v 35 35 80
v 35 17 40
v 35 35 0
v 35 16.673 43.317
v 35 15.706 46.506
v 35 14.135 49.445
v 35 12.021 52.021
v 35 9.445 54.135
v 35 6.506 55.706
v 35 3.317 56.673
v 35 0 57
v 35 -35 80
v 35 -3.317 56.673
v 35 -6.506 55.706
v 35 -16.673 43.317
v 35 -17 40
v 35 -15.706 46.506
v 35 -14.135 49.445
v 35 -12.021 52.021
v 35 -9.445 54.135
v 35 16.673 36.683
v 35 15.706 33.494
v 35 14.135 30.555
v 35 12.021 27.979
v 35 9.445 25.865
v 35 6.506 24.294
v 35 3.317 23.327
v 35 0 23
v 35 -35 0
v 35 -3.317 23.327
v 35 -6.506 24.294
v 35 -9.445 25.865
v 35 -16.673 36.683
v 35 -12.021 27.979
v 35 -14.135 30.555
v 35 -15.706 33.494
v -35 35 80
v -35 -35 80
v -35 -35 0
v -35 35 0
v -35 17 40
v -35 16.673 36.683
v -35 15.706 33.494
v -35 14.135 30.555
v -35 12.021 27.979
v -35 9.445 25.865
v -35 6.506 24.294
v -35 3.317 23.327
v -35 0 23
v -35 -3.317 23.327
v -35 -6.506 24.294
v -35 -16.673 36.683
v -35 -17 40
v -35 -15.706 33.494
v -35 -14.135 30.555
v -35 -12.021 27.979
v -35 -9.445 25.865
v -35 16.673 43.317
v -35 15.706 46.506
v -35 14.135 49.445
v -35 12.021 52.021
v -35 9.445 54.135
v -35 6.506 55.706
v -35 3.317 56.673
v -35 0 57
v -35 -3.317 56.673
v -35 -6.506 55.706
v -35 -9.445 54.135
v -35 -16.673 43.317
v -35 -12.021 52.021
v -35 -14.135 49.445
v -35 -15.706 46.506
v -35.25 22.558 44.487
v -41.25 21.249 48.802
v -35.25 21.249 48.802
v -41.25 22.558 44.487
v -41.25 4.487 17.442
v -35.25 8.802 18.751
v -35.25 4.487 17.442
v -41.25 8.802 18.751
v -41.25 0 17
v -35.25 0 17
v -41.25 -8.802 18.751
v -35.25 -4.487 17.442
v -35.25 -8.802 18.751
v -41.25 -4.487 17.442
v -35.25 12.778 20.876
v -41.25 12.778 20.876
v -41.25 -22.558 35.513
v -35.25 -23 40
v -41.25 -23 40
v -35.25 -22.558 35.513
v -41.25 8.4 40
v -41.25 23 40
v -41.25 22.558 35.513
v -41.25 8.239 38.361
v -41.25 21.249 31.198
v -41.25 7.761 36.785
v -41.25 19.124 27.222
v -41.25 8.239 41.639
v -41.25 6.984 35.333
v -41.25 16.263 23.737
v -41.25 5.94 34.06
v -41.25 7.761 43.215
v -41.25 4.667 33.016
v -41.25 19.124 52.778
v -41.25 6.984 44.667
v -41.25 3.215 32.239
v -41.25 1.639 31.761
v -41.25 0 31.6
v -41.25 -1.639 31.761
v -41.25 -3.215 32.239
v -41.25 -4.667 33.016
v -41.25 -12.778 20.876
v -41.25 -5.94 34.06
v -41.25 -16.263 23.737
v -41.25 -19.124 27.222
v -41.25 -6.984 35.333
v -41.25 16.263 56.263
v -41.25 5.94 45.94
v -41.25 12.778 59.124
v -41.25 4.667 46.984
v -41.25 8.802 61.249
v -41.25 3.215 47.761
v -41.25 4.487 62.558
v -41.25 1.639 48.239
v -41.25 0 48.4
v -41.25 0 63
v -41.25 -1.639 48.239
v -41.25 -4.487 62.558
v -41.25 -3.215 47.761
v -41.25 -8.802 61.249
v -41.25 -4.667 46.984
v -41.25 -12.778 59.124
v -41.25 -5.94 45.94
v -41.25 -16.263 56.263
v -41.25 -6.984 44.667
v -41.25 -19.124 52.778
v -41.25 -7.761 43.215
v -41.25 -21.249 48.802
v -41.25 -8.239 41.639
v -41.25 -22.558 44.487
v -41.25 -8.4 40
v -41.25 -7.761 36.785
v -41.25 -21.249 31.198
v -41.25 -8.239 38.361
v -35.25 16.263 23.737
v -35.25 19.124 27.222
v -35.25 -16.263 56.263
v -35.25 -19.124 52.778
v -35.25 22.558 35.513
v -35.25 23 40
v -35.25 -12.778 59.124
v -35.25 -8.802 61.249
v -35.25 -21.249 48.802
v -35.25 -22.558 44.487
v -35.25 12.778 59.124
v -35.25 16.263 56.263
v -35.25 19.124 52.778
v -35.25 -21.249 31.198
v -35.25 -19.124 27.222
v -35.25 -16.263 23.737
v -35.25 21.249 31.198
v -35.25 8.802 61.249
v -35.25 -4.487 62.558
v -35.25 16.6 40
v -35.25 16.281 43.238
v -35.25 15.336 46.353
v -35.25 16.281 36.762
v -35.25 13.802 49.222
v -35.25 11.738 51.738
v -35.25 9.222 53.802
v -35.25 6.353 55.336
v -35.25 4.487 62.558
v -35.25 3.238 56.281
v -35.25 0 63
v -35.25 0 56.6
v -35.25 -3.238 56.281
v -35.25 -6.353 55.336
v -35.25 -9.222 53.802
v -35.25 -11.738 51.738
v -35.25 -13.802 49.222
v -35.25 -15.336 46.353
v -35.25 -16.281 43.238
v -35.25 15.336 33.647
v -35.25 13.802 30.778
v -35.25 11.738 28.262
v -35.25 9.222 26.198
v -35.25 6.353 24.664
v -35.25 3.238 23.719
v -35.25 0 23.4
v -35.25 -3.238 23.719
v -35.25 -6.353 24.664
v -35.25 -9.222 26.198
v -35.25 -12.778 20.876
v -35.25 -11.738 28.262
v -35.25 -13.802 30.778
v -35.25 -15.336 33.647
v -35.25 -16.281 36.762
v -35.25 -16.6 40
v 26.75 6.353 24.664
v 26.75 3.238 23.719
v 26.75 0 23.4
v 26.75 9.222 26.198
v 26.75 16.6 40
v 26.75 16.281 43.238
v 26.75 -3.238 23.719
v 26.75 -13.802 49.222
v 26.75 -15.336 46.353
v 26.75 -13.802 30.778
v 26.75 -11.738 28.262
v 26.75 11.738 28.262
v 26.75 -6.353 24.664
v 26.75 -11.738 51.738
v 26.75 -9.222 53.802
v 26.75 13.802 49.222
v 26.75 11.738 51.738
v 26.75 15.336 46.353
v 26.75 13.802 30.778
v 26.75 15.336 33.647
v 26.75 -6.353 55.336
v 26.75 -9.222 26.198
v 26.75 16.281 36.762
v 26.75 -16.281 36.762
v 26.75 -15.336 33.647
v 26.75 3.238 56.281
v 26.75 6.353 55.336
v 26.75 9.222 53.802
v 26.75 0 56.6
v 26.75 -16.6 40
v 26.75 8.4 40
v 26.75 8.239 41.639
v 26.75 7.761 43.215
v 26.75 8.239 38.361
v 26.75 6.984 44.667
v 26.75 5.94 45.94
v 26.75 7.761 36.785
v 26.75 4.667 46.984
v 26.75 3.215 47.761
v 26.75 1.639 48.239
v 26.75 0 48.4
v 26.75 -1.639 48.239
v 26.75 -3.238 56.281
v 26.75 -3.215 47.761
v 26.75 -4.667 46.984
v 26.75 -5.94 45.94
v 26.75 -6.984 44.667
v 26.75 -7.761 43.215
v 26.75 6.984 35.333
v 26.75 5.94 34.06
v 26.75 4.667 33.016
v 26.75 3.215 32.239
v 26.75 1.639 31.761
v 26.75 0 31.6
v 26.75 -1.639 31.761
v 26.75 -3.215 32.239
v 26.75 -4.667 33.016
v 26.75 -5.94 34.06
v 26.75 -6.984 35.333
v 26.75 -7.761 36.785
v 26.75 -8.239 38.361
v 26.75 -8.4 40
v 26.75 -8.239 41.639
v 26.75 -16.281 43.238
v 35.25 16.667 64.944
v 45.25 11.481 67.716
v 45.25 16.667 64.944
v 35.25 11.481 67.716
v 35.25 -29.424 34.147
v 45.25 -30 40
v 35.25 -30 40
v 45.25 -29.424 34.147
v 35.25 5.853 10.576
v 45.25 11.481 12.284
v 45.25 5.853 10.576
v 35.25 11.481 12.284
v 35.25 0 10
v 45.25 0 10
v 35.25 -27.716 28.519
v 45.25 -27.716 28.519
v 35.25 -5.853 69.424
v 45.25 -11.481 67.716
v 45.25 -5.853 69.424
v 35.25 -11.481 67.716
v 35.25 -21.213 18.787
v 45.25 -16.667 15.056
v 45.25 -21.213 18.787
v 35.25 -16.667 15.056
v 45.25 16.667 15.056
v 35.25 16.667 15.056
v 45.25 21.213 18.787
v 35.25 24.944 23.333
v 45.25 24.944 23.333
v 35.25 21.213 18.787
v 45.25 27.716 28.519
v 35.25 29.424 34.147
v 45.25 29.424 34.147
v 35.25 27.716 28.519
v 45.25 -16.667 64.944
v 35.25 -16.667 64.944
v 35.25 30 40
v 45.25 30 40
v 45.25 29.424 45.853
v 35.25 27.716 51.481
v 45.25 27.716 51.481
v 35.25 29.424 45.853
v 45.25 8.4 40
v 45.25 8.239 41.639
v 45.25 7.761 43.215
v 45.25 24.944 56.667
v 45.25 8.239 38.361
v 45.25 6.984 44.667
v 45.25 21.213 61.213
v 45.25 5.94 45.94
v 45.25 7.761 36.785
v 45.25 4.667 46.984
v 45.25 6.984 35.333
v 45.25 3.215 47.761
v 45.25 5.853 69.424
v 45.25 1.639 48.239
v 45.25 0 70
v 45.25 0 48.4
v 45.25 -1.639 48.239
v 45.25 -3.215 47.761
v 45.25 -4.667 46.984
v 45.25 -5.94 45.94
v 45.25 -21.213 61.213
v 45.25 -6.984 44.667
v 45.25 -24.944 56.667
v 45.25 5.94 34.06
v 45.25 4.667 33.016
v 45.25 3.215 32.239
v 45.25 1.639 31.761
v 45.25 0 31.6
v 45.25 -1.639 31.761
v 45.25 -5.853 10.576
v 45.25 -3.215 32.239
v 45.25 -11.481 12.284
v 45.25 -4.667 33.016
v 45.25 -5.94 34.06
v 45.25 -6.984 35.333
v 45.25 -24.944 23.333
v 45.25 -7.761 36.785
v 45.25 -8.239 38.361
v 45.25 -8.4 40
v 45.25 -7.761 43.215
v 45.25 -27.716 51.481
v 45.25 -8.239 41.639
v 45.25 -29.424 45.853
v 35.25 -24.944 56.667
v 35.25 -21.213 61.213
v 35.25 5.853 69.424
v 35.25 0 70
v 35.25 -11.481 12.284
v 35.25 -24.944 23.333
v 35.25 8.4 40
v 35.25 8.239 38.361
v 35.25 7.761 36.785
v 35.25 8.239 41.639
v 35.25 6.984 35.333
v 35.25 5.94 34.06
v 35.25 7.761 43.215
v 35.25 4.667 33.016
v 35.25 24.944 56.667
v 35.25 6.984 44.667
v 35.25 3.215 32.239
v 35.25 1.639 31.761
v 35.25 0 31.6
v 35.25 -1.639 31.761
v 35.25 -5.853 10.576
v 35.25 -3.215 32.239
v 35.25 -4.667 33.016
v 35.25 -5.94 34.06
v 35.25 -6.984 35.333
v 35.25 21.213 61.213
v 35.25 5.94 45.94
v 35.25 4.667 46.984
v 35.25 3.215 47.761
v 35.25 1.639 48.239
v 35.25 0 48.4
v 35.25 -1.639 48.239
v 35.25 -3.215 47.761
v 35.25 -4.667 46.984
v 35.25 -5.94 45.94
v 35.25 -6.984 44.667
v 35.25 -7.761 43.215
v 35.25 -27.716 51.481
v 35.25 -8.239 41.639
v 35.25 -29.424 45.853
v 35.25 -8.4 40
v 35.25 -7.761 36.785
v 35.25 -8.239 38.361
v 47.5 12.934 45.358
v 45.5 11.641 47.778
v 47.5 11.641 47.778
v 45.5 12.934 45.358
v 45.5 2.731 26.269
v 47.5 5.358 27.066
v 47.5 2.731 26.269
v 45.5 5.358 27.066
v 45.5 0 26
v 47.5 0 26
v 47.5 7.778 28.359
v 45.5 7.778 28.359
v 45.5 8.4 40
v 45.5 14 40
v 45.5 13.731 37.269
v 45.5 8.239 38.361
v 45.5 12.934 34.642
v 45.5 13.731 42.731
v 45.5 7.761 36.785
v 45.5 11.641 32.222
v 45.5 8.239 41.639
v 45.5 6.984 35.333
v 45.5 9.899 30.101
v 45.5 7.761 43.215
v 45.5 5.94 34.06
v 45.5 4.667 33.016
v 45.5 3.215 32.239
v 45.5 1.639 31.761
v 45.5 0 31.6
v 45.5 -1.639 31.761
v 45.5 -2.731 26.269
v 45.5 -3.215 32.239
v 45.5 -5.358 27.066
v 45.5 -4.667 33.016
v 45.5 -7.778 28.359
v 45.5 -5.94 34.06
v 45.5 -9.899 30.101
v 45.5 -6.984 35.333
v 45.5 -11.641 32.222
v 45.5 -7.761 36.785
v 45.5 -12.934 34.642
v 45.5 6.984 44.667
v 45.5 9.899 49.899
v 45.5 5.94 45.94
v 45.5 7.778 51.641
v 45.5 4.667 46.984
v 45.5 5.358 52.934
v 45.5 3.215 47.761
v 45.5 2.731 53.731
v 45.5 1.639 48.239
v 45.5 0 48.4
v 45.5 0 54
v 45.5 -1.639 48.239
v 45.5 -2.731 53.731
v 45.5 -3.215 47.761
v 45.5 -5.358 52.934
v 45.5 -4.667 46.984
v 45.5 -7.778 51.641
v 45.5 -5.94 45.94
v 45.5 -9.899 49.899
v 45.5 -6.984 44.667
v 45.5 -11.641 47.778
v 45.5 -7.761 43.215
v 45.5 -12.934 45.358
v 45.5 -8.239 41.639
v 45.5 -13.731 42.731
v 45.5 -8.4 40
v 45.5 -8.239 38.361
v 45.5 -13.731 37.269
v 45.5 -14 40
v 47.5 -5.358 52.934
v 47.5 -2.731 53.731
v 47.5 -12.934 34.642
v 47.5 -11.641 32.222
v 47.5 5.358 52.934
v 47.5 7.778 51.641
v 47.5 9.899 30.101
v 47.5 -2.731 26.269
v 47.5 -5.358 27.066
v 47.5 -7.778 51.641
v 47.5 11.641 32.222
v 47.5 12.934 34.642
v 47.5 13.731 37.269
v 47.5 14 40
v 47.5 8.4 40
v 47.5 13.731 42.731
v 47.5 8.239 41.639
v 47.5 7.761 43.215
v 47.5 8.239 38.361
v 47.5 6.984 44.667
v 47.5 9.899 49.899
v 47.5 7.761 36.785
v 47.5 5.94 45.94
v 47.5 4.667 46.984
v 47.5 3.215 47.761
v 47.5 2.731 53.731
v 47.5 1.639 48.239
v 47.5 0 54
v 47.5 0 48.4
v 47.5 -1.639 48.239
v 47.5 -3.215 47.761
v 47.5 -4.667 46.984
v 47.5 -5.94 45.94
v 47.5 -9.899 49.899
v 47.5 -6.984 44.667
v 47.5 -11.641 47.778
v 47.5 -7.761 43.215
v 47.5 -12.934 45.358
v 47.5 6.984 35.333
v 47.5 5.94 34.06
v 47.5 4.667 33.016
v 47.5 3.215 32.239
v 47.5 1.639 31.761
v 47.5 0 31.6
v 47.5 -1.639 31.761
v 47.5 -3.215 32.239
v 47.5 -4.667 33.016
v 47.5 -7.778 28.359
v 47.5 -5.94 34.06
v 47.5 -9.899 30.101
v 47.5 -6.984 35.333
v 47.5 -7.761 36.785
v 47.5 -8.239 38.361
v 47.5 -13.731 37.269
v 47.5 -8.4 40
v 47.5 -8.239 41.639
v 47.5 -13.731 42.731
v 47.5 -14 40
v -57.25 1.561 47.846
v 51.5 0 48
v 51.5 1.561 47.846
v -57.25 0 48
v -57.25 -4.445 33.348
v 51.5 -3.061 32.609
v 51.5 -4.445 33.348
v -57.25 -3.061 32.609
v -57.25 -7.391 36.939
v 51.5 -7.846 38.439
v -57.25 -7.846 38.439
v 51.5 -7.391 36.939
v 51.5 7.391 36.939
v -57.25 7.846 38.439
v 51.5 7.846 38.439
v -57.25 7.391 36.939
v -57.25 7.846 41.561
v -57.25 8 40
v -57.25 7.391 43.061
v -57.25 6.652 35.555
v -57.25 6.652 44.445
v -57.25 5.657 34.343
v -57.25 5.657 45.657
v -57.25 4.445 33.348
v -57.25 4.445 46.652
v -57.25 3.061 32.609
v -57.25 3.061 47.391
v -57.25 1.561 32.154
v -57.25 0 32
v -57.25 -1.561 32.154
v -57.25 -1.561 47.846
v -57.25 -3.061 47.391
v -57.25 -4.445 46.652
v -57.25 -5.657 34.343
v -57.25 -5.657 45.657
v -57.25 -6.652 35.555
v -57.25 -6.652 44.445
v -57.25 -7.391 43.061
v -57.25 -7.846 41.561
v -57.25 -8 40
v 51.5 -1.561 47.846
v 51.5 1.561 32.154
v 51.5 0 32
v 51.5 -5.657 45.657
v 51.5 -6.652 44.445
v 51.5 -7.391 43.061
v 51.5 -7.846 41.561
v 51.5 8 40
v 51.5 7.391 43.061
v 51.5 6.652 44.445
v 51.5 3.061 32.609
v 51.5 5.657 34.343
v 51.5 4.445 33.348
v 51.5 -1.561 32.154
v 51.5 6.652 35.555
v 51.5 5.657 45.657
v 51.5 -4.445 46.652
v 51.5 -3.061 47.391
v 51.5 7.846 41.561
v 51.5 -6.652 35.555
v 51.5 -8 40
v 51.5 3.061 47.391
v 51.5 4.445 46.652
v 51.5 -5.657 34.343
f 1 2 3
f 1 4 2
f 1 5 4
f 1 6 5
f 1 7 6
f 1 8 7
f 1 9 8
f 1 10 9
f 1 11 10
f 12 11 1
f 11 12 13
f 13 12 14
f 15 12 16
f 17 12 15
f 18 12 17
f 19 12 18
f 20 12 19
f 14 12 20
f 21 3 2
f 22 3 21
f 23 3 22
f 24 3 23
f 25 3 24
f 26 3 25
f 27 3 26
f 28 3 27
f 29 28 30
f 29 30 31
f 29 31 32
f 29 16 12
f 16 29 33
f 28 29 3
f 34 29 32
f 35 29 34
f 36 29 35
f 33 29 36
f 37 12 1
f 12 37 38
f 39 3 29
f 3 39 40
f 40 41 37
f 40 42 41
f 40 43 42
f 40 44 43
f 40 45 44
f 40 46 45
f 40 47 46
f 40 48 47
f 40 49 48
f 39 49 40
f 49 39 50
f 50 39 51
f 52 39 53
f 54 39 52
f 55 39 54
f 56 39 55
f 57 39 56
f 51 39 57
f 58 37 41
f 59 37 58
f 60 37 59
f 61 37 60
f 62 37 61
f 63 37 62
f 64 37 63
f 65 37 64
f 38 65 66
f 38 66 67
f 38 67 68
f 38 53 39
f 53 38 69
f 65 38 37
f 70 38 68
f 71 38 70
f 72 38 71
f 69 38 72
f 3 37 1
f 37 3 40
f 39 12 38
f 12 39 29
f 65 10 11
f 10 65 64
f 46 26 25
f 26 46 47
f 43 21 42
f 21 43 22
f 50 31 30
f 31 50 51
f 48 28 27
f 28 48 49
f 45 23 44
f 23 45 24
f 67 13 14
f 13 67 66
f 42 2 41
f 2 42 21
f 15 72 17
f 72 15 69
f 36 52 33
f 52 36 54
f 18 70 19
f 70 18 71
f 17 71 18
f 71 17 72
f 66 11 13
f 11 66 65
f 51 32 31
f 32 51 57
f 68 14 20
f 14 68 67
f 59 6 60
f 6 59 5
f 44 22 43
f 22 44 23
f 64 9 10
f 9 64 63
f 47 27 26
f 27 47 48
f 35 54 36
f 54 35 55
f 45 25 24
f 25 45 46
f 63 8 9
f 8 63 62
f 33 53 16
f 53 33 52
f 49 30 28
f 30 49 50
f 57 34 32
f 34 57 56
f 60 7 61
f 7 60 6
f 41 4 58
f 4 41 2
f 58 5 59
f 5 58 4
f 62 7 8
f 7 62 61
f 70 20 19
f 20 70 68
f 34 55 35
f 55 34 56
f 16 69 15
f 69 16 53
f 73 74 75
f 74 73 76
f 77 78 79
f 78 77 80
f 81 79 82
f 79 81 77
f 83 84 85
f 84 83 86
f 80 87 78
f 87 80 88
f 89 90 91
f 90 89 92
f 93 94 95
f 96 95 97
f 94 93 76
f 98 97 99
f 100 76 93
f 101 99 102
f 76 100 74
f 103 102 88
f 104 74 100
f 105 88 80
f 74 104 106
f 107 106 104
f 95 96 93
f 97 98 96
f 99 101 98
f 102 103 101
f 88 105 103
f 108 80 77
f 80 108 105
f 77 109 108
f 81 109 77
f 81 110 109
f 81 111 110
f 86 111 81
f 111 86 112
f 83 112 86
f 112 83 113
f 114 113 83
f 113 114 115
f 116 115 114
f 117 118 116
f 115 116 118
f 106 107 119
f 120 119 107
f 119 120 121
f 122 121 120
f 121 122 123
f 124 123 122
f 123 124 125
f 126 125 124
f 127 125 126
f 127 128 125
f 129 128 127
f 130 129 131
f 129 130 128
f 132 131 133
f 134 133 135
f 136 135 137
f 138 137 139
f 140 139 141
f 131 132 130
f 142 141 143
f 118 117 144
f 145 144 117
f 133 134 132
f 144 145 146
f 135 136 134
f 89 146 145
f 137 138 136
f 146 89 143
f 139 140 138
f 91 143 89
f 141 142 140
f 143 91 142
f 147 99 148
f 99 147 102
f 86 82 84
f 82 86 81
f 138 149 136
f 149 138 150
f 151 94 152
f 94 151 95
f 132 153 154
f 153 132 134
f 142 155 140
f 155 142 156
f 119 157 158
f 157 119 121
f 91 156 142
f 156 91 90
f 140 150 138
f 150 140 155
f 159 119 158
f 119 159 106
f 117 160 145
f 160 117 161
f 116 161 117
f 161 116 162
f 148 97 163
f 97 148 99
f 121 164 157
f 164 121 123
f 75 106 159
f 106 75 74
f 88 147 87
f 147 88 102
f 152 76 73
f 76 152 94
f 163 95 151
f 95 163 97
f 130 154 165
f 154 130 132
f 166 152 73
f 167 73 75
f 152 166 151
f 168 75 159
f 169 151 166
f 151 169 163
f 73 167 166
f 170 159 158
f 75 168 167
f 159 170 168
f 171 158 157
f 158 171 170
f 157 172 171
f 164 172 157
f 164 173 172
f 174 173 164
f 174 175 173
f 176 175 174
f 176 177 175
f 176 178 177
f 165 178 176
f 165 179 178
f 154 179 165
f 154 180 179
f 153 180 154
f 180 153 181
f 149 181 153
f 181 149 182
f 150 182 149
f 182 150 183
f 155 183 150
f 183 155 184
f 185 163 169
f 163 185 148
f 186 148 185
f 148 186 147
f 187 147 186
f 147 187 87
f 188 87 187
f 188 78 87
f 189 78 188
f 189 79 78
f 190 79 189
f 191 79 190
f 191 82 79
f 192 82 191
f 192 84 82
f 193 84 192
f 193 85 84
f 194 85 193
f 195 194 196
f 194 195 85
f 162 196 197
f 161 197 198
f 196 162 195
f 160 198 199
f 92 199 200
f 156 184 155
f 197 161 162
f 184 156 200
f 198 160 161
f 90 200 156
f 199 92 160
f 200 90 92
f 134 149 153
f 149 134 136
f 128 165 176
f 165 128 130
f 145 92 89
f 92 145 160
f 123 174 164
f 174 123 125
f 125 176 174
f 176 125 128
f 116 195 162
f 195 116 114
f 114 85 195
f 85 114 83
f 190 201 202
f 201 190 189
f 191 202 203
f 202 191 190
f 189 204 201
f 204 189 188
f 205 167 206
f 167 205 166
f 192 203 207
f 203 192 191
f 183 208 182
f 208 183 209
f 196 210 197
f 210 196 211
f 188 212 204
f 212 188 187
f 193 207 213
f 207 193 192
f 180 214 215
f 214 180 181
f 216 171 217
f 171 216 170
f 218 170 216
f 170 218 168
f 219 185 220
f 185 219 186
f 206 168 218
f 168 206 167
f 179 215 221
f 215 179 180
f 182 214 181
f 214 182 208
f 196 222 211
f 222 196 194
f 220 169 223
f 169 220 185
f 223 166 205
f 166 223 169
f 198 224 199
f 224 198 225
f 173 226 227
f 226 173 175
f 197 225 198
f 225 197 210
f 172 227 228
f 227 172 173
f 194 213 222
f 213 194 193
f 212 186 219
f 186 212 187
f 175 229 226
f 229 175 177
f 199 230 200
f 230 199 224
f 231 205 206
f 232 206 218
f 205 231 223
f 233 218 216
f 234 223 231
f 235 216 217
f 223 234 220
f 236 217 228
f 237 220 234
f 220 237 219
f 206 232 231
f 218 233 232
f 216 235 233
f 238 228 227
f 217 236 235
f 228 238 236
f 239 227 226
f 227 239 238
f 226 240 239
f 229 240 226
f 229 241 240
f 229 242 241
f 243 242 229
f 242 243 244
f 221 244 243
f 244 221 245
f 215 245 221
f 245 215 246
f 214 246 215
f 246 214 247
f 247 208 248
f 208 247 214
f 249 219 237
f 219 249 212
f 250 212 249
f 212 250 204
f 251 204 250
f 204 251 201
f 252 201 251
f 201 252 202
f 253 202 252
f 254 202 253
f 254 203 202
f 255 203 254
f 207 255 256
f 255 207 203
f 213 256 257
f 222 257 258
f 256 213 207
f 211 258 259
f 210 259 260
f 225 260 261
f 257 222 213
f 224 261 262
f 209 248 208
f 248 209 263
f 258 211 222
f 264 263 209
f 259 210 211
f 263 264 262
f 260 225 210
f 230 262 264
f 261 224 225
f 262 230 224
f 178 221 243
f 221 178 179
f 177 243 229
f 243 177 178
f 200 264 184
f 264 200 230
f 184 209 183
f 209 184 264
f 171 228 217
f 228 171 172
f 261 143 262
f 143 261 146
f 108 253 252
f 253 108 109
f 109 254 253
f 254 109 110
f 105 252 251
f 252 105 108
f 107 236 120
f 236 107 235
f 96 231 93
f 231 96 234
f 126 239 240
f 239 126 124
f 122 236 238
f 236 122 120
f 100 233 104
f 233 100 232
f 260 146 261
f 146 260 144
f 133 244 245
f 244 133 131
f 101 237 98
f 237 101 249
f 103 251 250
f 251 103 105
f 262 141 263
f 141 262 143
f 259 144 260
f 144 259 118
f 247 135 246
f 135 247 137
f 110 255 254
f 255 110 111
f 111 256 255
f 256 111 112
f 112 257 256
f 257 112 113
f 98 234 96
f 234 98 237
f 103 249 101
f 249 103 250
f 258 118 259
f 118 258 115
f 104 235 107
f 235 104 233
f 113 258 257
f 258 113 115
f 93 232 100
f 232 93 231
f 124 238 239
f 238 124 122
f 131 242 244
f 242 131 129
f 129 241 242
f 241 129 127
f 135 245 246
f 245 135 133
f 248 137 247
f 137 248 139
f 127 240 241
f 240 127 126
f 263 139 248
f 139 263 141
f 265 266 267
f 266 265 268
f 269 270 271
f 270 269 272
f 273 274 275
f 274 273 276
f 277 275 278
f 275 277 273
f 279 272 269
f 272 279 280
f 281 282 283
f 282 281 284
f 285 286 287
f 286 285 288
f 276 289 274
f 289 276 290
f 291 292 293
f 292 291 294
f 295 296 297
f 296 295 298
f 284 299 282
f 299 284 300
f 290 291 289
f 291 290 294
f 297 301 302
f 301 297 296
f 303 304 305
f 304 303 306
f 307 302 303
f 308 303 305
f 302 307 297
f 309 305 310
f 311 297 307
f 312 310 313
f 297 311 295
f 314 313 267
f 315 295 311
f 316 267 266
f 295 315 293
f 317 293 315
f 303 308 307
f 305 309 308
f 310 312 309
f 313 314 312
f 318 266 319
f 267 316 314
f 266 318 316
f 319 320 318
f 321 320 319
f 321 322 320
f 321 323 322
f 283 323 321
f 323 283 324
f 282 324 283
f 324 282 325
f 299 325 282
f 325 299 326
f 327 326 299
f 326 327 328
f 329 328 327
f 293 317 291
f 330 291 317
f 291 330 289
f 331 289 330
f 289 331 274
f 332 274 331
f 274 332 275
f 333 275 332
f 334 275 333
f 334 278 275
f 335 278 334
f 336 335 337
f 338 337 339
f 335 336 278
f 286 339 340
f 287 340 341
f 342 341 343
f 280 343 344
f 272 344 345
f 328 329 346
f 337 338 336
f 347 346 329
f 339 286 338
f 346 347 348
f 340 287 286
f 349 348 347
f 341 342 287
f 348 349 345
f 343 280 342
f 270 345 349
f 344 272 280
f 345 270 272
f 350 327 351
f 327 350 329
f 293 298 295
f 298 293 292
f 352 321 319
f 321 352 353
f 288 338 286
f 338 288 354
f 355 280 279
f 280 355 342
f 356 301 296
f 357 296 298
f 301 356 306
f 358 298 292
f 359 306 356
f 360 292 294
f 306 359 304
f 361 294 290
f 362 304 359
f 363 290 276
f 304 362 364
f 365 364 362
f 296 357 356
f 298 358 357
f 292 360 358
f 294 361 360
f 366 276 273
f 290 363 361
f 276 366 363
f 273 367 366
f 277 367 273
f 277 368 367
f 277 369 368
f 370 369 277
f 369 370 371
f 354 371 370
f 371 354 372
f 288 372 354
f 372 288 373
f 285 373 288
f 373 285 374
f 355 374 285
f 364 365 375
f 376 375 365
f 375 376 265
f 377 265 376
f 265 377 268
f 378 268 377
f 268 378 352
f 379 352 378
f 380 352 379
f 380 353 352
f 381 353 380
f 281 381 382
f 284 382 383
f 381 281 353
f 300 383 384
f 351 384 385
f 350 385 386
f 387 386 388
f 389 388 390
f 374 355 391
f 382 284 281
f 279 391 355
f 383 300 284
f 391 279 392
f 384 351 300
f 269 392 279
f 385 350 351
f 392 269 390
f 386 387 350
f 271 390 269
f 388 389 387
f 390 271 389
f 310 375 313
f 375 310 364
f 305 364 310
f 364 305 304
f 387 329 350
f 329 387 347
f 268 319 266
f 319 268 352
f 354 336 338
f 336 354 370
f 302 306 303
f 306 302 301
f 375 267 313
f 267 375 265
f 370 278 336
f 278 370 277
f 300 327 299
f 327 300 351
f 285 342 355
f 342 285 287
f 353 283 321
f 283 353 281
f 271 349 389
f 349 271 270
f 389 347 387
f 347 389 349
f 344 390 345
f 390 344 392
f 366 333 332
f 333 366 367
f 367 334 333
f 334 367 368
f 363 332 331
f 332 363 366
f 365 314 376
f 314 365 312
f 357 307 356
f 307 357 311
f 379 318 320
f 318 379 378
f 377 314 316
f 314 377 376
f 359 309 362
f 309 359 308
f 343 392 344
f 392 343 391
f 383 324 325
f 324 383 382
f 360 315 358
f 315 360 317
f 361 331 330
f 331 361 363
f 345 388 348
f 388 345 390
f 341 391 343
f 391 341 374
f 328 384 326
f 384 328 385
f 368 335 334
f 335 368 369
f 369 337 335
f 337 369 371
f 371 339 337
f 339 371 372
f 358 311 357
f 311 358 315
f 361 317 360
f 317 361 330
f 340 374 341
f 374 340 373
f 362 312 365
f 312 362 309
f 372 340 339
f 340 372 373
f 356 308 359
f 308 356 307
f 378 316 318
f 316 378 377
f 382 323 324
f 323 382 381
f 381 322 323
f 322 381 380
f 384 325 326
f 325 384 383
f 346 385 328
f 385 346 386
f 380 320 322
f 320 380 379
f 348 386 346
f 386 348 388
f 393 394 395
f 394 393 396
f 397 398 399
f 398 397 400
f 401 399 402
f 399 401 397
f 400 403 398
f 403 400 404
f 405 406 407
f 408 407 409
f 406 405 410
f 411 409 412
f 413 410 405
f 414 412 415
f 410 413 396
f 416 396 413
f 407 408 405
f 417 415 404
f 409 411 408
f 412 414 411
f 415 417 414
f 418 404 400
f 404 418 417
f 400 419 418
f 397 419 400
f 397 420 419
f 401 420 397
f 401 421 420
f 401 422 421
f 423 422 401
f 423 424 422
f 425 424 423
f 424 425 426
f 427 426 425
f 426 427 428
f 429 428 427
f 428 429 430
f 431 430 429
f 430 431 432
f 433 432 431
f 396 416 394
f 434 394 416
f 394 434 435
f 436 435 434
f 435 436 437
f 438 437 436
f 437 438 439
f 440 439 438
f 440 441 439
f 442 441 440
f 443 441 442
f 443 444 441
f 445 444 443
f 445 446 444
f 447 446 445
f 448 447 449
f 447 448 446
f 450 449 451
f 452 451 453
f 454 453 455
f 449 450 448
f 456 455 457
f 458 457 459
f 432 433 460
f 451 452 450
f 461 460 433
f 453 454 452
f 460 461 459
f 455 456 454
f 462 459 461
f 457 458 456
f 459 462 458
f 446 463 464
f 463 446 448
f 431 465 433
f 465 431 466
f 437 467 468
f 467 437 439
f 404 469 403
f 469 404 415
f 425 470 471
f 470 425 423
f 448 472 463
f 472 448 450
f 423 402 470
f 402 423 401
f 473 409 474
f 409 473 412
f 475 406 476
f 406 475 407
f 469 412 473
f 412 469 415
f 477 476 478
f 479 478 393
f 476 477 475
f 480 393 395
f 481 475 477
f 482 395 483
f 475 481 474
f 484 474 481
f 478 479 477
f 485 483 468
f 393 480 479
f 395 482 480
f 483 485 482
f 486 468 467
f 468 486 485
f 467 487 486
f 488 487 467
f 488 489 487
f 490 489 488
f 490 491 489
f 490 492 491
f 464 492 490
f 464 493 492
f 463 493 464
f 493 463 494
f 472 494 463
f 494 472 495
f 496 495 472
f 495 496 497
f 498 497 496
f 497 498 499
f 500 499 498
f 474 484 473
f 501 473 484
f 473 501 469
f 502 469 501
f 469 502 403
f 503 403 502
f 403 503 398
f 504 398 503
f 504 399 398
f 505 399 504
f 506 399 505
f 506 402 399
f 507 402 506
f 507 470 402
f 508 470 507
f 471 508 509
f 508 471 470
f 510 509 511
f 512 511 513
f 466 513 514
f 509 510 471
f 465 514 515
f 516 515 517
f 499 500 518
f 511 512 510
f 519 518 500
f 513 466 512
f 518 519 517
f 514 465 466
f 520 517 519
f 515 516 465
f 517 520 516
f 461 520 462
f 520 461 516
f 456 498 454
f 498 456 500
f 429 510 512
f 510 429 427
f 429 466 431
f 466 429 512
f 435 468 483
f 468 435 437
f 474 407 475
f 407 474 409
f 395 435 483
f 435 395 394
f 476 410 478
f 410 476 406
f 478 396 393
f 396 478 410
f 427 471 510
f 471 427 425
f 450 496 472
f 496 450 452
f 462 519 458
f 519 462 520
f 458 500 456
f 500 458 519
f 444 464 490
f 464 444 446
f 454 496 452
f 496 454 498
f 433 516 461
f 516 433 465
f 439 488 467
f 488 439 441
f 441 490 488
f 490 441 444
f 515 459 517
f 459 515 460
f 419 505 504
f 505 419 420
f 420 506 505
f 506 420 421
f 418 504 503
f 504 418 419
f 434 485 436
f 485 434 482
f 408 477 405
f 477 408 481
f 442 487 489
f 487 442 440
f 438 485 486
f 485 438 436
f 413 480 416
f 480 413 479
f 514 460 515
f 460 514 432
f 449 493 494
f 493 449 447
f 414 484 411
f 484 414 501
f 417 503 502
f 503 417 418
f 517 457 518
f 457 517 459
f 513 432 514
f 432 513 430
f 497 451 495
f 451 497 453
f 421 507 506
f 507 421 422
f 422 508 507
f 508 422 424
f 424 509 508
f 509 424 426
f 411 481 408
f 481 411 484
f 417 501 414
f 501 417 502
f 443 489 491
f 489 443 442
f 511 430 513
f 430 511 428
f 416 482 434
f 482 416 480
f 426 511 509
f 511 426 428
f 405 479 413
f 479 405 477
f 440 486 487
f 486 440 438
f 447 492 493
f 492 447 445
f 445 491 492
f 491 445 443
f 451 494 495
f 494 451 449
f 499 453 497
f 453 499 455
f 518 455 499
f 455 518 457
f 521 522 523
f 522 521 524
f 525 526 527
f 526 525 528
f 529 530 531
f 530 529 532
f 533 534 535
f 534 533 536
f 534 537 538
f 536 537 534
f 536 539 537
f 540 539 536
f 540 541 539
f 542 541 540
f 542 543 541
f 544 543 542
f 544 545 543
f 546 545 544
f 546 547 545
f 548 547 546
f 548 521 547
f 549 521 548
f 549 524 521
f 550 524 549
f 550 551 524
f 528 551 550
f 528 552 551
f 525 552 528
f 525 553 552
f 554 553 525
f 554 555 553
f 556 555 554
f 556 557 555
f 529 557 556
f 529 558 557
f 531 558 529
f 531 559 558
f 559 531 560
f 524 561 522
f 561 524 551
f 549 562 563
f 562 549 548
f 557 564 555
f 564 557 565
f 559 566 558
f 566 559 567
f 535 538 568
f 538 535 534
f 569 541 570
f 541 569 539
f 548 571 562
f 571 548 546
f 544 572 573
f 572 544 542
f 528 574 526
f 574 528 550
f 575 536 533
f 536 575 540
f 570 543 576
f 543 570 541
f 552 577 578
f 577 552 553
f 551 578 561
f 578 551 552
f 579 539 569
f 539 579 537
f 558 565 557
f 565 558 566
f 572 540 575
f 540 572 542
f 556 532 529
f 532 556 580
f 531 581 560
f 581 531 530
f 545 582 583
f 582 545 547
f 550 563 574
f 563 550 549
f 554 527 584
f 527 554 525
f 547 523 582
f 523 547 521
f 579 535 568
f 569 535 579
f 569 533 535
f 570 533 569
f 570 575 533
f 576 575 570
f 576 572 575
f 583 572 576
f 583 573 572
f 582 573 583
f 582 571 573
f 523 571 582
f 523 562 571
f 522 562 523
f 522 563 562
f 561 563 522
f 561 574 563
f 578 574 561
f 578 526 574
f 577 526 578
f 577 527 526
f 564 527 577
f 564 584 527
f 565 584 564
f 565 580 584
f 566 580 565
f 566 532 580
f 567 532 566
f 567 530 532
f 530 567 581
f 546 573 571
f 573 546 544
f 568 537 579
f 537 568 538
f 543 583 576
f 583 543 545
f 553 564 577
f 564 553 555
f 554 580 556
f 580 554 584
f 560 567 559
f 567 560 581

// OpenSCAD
$fn = 32;

// ------------------------------------------------------------------------
// Bushed housing: 70 x 70 x 80 mm housing, bushing d33.2
// Every part is its own module, assembly() places them once.
// ------------------------------------------------------------------------

// --- part 1 ---
module housing() {
  difference() {
    translate([-35, -35, 0]) cube([70, 70, 80]);
    translate([0, 0, 40]) rotate([0, 90, 0]) cylinder(h = 72, d = 34, center = true);
  }
}

// --- part 2 ---
module bushing() {
  difference() {
    union() {
      cylinder(h = 6, d = 46);
      translate([0, 0, 6]) cylinder(h = 62, d = 33.2);
    }
    translate([0, 0, -1]) cylinder(h = 70, d = 16.8);
  }
}

// --- part 3 ---
module shaft() {
  translate([0, 0, -54.375]) cylinder(h = 108.75, d = 16);
}

// --- part 4 ---
module cover() {
  difference() {
    cylinder(h = 10, d = 60);
    translate([0, 0, -1]) cylinder(h = 12, d = 16.8);
  }
}

// --- part 5 ---
module washer() {
  difference() {
      translate([0, 0, 0]) cylinder(h = 2, d = 28);
      translate([0, 0, -1]) cylinder(h = 4, d = 16.8);
    }
}

// --- assembly ---
module assembly() {
  translate([0, 0, 0]) rotate([0, 0, 0]) housing();
  translate([-41.25, 0, 40]) rotate([0, 90, 0]) bushing();
  translate([-2.875, 0, 40]) rotate([0, 90, 0]) shaft();
  translate([35.25, 0, 40]) rotate([0, 90, 0]) cover();
  translate([45.5, 0, 40]) rotate([0, 90, 0]) washer();
}

assembly();
